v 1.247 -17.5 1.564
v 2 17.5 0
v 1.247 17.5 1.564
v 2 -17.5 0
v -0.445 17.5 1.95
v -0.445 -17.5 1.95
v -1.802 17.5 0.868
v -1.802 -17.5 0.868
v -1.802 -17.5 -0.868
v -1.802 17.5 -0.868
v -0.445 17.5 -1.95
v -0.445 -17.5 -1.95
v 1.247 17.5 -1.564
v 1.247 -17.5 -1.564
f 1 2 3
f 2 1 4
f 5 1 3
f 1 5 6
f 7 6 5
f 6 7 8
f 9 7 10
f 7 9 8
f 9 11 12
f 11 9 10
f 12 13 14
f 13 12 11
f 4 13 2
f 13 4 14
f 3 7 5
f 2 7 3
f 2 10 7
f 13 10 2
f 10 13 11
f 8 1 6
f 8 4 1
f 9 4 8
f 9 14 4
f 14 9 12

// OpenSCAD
//$fa = 1;
//$fs = 0.4;

module axle(track=35, radius=2) {
    rotate([90, 0, 0]) {
        cylinder(r=radius, h=track, center=true);
    }
}

axle();
